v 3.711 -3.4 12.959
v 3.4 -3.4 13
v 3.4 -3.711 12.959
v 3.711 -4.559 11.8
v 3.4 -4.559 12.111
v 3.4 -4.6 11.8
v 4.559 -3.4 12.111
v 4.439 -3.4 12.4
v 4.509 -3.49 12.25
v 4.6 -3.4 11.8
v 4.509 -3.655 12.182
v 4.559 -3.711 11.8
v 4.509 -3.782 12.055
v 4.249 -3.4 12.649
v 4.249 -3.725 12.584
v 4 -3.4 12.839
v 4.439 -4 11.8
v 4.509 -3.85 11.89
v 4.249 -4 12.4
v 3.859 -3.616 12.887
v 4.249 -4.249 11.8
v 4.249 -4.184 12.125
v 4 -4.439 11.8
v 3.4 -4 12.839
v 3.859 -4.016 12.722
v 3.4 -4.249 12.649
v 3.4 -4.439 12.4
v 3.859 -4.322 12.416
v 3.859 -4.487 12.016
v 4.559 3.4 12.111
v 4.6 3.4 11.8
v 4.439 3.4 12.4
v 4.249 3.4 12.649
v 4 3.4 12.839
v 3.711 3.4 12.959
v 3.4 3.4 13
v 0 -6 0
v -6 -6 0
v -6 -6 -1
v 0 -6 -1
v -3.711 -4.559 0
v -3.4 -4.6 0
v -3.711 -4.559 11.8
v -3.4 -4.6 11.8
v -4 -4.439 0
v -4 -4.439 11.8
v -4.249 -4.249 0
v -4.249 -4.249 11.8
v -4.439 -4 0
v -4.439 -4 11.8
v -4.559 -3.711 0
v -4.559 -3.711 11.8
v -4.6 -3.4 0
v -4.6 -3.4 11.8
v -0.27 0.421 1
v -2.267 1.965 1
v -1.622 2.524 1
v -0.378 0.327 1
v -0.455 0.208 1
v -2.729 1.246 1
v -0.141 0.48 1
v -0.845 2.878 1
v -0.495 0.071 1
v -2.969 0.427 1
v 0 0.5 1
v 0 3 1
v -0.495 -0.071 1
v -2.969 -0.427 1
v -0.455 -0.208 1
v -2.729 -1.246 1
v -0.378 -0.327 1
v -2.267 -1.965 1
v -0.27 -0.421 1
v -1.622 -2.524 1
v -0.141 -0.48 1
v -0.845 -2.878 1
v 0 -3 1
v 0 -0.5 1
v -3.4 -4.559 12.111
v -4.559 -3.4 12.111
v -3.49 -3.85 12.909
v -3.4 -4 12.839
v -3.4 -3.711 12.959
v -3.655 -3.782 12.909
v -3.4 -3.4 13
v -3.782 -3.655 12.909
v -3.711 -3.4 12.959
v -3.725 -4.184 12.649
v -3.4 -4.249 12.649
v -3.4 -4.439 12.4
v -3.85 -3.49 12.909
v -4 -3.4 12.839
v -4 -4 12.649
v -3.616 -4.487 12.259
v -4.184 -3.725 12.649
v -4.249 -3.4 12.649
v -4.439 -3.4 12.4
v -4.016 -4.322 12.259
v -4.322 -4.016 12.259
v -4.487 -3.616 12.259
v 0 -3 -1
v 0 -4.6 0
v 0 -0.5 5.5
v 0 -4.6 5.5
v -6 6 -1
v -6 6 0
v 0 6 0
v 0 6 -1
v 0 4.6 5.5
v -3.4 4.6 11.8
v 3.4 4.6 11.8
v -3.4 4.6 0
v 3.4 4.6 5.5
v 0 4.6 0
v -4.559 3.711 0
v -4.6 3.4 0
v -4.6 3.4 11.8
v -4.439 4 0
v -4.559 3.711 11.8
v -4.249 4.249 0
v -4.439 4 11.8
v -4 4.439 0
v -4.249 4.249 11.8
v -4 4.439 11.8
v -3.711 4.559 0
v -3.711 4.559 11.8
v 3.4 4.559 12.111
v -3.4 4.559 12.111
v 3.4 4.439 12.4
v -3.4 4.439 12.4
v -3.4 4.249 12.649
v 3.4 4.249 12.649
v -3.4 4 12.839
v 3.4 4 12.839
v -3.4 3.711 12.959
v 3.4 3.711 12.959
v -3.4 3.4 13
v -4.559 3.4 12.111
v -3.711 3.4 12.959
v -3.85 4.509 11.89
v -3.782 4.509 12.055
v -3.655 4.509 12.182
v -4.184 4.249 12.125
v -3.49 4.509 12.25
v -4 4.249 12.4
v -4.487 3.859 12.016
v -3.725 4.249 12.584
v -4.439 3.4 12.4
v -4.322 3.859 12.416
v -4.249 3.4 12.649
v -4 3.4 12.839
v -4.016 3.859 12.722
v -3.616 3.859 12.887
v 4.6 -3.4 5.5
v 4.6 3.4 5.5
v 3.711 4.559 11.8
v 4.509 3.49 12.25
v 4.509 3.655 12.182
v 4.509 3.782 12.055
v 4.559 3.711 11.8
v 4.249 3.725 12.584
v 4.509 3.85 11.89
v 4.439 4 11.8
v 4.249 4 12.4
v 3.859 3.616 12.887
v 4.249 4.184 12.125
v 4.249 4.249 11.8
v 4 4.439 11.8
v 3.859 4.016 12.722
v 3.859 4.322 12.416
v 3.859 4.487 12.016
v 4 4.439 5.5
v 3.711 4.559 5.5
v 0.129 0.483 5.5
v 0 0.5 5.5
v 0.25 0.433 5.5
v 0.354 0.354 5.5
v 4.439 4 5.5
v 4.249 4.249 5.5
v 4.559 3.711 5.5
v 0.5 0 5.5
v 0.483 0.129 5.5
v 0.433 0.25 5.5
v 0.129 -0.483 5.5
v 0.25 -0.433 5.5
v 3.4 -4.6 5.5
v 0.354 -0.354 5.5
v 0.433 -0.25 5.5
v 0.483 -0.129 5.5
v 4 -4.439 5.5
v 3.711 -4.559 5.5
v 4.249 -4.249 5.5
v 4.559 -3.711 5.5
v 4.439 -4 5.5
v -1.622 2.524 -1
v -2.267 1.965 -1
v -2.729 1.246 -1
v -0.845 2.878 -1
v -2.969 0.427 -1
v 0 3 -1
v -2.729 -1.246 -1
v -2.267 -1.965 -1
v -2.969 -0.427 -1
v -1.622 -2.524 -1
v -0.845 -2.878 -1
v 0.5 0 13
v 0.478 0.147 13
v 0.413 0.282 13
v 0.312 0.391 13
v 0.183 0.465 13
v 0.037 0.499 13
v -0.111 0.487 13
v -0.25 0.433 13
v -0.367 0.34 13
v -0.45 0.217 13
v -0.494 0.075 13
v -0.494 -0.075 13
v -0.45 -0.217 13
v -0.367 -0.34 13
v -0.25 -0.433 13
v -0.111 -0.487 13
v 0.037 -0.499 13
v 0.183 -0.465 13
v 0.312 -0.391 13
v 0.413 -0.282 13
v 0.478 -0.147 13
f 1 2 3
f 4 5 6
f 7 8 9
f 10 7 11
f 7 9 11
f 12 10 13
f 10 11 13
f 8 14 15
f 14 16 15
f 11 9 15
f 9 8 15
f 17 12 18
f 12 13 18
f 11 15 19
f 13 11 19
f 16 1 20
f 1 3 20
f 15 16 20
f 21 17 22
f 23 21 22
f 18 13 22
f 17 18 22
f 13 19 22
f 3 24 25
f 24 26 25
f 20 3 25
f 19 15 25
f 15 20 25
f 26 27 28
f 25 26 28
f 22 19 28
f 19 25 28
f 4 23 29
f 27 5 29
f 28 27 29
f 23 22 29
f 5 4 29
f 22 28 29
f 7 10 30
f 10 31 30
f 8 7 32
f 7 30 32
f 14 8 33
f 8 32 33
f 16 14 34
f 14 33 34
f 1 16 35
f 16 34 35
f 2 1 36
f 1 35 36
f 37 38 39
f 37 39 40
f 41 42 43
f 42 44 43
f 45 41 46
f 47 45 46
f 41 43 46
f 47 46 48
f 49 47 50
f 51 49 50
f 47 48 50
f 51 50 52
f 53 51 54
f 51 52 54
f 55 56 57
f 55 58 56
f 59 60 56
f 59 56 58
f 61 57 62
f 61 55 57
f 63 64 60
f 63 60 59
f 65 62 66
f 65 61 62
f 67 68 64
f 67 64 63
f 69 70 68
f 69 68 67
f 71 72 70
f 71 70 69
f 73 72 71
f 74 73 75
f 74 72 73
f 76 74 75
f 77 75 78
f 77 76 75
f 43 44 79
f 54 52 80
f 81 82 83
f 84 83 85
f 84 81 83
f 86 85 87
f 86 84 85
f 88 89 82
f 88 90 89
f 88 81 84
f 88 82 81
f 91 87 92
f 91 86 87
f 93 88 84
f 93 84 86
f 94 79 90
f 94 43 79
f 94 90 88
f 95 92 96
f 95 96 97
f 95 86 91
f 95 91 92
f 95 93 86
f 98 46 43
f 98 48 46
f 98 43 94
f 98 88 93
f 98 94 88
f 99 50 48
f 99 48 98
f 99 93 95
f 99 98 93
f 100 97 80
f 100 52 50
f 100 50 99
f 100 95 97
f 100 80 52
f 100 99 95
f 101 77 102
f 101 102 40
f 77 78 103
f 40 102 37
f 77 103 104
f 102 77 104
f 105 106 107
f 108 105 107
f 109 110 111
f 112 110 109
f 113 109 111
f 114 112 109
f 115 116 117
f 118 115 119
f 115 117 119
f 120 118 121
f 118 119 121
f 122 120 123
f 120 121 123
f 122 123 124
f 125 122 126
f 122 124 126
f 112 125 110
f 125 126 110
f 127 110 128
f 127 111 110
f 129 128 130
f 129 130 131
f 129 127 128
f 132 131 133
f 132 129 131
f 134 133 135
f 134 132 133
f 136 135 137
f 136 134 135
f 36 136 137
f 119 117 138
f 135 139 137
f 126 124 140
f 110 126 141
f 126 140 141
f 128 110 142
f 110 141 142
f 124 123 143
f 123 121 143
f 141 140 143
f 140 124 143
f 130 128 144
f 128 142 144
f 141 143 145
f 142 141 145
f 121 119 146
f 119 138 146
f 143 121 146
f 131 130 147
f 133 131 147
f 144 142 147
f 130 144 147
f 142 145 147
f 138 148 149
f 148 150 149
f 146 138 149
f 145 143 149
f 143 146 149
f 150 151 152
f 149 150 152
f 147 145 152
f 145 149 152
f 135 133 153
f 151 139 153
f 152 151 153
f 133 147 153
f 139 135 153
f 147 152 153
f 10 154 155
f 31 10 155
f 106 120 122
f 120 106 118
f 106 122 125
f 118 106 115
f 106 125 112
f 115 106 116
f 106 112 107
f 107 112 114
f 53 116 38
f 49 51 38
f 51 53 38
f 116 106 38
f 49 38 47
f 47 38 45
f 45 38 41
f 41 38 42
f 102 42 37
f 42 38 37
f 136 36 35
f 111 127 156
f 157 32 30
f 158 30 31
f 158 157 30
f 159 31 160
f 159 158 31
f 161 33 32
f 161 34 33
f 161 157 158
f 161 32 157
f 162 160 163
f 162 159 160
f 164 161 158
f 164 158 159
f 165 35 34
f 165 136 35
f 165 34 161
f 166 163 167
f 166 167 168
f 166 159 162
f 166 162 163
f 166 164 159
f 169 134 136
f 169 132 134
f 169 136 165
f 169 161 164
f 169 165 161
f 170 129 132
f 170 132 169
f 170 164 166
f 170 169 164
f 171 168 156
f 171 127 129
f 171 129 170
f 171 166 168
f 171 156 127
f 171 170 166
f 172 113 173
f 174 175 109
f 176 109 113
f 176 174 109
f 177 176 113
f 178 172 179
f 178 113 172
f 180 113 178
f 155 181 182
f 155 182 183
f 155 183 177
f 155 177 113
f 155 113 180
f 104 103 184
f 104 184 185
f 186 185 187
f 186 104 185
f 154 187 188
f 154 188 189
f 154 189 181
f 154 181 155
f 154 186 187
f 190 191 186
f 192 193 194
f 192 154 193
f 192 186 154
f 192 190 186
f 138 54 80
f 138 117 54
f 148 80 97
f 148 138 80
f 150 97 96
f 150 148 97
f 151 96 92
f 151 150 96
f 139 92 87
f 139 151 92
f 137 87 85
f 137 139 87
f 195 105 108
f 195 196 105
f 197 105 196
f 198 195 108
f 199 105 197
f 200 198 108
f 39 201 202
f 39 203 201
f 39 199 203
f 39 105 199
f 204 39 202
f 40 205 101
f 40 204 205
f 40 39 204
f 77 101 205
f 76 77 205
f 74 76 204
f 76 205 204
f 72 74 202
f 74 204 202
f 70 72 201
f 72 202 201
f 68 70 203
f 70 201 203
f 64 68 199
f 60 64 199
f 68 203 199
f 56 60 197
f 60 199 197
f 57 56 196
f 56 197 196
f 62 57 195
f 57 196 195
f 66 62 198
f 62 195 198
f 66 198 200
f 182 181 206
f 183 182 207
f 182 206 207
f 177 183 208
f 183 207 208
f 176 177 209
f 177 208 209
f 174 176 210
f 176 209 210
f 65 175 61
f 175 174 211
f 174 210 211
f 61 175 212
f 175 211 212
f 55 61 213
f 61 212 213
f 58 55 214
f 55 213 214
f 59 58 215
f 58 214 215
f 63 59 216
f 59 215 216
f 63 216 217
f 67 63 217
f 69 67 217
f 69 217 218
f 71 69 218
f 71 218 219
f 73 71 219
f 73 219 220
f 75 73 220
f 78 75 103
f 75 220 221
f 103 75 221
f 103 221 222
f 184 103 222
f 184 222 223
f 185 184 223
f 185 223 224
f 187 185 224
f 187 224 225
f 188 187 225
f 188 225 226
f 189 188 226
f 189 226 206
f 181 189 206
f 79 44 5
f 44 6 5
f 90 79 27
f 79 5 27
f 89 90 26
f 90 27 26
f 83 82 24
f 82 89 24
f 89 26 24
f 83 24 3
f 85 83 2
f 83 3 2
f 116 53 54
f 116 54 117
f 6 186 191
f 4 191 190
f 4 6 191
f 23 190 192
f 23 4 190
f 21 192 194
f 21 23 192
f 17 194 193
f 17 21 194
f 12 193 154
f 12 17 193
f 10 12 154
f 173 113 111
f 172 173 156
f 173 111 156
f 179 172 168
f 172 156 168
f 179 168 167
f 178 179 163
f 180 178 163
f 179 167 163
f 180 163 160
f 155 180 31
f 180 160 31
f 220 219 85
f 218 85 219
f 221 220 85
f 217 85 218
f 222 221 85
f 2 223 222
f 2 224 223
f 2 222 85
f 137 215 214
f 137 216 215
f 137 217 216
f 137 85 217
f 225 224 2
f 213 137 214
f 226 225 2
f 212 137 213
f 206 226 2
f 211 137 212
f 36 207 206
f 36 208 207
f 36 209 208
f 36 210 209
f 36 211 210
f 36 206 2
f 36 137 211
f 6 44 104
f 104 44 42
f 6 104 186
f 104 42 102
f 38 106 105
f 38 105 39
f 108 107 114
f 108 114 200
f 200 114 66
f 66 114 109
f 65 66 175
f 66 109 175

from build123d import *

# Parameters (mm, degrees)
SKETCH_W        = 9.2
SKETCH_H        = 9.2
PAD_DEPTH       = 13
SKETCH002_W     = 6
SKETCH002_H     = 12
PAD001_DEPTH    = 1
SKETCH008_R     = 3
POCKET_DEPTH    = 2
SKETCH004_W     = 4.6
SKETCH004_H     = 9.2
POCKET001_DEPTH = 7.5
SKETCH009_R     = 0.5
POCKET002_DEPTH = 14.001
FILLET_R        = 1.2


with BuildPart() as part:
    # Sketch → Pad (new body)
    with BuildSketch(Plane.XY):
        Rectangle(SKETCH_W, SKETCH_H)
    extrude(amount=PAD_DEPTH)

    # Sketch002 → Pad001 (join)
    with BuildSketch(Plane(origin=(0, 0, 0), x_dir=(1, 0, 0), z_dir=(0, 0, -1))):
        with Locations((-3, 0)):
            Rectangle(SKETCH002_W, SKETCH002_H)
    extrude(amount=PAD001_DEPTH)

    # Sketch008 (on Face12 of Pad001) → Pocket (cut)
    with BuildSketch(Plane(origin=(0, 0, -1), x_dir=(1, 0, 0), z_dir=(0, 0, -1))):
        Circle(SKETCH008_R)
    extrude(amount=-POCKET_DEPTH, mode=Mode.SUBTRACT)

    # Sketch004 → Pocket001 (cut)
    with BuildSketch(Plane(origin=(0, 0, -2), x_dir=(1, 0, 0), z_dir=(0, 0, -1))):
        with Locations((2.3, 0)):
            Rectangle(SKETCH004_W, SKETCH004_H)
    extrude(amount=-POCKET001_DEPTH, mode=Mode.SUBTRACT)

    # Sketch009 (on Face6 of Pocket001) → Pocket002 (cut, through all)
    with BuildSketch(Plane.XY.offset(13)):
        Circle(SKETCH009_R)
    extrude(amount=-POCKET002_DEPTH, mode=Mode.SUBTRACT)

    # Fillet
    fillet_edges = [part.edges().sort_by_distance(p)[0] for p in [
        (-4.6, -4.6, 6.5),
        (0, -4.6, 13),
        (-4.6, 0, 13),
        (-4.6, 4.6, 6.5),
        (0, 4.6, 13),
        (4.6, 0, 13),
        (4.6, 4.6, 9.25),
        (4.6, -4.6, 9.25),
    ]]
    fillet(fillet_edges, radius=FILLET_R)


solid = part.part
